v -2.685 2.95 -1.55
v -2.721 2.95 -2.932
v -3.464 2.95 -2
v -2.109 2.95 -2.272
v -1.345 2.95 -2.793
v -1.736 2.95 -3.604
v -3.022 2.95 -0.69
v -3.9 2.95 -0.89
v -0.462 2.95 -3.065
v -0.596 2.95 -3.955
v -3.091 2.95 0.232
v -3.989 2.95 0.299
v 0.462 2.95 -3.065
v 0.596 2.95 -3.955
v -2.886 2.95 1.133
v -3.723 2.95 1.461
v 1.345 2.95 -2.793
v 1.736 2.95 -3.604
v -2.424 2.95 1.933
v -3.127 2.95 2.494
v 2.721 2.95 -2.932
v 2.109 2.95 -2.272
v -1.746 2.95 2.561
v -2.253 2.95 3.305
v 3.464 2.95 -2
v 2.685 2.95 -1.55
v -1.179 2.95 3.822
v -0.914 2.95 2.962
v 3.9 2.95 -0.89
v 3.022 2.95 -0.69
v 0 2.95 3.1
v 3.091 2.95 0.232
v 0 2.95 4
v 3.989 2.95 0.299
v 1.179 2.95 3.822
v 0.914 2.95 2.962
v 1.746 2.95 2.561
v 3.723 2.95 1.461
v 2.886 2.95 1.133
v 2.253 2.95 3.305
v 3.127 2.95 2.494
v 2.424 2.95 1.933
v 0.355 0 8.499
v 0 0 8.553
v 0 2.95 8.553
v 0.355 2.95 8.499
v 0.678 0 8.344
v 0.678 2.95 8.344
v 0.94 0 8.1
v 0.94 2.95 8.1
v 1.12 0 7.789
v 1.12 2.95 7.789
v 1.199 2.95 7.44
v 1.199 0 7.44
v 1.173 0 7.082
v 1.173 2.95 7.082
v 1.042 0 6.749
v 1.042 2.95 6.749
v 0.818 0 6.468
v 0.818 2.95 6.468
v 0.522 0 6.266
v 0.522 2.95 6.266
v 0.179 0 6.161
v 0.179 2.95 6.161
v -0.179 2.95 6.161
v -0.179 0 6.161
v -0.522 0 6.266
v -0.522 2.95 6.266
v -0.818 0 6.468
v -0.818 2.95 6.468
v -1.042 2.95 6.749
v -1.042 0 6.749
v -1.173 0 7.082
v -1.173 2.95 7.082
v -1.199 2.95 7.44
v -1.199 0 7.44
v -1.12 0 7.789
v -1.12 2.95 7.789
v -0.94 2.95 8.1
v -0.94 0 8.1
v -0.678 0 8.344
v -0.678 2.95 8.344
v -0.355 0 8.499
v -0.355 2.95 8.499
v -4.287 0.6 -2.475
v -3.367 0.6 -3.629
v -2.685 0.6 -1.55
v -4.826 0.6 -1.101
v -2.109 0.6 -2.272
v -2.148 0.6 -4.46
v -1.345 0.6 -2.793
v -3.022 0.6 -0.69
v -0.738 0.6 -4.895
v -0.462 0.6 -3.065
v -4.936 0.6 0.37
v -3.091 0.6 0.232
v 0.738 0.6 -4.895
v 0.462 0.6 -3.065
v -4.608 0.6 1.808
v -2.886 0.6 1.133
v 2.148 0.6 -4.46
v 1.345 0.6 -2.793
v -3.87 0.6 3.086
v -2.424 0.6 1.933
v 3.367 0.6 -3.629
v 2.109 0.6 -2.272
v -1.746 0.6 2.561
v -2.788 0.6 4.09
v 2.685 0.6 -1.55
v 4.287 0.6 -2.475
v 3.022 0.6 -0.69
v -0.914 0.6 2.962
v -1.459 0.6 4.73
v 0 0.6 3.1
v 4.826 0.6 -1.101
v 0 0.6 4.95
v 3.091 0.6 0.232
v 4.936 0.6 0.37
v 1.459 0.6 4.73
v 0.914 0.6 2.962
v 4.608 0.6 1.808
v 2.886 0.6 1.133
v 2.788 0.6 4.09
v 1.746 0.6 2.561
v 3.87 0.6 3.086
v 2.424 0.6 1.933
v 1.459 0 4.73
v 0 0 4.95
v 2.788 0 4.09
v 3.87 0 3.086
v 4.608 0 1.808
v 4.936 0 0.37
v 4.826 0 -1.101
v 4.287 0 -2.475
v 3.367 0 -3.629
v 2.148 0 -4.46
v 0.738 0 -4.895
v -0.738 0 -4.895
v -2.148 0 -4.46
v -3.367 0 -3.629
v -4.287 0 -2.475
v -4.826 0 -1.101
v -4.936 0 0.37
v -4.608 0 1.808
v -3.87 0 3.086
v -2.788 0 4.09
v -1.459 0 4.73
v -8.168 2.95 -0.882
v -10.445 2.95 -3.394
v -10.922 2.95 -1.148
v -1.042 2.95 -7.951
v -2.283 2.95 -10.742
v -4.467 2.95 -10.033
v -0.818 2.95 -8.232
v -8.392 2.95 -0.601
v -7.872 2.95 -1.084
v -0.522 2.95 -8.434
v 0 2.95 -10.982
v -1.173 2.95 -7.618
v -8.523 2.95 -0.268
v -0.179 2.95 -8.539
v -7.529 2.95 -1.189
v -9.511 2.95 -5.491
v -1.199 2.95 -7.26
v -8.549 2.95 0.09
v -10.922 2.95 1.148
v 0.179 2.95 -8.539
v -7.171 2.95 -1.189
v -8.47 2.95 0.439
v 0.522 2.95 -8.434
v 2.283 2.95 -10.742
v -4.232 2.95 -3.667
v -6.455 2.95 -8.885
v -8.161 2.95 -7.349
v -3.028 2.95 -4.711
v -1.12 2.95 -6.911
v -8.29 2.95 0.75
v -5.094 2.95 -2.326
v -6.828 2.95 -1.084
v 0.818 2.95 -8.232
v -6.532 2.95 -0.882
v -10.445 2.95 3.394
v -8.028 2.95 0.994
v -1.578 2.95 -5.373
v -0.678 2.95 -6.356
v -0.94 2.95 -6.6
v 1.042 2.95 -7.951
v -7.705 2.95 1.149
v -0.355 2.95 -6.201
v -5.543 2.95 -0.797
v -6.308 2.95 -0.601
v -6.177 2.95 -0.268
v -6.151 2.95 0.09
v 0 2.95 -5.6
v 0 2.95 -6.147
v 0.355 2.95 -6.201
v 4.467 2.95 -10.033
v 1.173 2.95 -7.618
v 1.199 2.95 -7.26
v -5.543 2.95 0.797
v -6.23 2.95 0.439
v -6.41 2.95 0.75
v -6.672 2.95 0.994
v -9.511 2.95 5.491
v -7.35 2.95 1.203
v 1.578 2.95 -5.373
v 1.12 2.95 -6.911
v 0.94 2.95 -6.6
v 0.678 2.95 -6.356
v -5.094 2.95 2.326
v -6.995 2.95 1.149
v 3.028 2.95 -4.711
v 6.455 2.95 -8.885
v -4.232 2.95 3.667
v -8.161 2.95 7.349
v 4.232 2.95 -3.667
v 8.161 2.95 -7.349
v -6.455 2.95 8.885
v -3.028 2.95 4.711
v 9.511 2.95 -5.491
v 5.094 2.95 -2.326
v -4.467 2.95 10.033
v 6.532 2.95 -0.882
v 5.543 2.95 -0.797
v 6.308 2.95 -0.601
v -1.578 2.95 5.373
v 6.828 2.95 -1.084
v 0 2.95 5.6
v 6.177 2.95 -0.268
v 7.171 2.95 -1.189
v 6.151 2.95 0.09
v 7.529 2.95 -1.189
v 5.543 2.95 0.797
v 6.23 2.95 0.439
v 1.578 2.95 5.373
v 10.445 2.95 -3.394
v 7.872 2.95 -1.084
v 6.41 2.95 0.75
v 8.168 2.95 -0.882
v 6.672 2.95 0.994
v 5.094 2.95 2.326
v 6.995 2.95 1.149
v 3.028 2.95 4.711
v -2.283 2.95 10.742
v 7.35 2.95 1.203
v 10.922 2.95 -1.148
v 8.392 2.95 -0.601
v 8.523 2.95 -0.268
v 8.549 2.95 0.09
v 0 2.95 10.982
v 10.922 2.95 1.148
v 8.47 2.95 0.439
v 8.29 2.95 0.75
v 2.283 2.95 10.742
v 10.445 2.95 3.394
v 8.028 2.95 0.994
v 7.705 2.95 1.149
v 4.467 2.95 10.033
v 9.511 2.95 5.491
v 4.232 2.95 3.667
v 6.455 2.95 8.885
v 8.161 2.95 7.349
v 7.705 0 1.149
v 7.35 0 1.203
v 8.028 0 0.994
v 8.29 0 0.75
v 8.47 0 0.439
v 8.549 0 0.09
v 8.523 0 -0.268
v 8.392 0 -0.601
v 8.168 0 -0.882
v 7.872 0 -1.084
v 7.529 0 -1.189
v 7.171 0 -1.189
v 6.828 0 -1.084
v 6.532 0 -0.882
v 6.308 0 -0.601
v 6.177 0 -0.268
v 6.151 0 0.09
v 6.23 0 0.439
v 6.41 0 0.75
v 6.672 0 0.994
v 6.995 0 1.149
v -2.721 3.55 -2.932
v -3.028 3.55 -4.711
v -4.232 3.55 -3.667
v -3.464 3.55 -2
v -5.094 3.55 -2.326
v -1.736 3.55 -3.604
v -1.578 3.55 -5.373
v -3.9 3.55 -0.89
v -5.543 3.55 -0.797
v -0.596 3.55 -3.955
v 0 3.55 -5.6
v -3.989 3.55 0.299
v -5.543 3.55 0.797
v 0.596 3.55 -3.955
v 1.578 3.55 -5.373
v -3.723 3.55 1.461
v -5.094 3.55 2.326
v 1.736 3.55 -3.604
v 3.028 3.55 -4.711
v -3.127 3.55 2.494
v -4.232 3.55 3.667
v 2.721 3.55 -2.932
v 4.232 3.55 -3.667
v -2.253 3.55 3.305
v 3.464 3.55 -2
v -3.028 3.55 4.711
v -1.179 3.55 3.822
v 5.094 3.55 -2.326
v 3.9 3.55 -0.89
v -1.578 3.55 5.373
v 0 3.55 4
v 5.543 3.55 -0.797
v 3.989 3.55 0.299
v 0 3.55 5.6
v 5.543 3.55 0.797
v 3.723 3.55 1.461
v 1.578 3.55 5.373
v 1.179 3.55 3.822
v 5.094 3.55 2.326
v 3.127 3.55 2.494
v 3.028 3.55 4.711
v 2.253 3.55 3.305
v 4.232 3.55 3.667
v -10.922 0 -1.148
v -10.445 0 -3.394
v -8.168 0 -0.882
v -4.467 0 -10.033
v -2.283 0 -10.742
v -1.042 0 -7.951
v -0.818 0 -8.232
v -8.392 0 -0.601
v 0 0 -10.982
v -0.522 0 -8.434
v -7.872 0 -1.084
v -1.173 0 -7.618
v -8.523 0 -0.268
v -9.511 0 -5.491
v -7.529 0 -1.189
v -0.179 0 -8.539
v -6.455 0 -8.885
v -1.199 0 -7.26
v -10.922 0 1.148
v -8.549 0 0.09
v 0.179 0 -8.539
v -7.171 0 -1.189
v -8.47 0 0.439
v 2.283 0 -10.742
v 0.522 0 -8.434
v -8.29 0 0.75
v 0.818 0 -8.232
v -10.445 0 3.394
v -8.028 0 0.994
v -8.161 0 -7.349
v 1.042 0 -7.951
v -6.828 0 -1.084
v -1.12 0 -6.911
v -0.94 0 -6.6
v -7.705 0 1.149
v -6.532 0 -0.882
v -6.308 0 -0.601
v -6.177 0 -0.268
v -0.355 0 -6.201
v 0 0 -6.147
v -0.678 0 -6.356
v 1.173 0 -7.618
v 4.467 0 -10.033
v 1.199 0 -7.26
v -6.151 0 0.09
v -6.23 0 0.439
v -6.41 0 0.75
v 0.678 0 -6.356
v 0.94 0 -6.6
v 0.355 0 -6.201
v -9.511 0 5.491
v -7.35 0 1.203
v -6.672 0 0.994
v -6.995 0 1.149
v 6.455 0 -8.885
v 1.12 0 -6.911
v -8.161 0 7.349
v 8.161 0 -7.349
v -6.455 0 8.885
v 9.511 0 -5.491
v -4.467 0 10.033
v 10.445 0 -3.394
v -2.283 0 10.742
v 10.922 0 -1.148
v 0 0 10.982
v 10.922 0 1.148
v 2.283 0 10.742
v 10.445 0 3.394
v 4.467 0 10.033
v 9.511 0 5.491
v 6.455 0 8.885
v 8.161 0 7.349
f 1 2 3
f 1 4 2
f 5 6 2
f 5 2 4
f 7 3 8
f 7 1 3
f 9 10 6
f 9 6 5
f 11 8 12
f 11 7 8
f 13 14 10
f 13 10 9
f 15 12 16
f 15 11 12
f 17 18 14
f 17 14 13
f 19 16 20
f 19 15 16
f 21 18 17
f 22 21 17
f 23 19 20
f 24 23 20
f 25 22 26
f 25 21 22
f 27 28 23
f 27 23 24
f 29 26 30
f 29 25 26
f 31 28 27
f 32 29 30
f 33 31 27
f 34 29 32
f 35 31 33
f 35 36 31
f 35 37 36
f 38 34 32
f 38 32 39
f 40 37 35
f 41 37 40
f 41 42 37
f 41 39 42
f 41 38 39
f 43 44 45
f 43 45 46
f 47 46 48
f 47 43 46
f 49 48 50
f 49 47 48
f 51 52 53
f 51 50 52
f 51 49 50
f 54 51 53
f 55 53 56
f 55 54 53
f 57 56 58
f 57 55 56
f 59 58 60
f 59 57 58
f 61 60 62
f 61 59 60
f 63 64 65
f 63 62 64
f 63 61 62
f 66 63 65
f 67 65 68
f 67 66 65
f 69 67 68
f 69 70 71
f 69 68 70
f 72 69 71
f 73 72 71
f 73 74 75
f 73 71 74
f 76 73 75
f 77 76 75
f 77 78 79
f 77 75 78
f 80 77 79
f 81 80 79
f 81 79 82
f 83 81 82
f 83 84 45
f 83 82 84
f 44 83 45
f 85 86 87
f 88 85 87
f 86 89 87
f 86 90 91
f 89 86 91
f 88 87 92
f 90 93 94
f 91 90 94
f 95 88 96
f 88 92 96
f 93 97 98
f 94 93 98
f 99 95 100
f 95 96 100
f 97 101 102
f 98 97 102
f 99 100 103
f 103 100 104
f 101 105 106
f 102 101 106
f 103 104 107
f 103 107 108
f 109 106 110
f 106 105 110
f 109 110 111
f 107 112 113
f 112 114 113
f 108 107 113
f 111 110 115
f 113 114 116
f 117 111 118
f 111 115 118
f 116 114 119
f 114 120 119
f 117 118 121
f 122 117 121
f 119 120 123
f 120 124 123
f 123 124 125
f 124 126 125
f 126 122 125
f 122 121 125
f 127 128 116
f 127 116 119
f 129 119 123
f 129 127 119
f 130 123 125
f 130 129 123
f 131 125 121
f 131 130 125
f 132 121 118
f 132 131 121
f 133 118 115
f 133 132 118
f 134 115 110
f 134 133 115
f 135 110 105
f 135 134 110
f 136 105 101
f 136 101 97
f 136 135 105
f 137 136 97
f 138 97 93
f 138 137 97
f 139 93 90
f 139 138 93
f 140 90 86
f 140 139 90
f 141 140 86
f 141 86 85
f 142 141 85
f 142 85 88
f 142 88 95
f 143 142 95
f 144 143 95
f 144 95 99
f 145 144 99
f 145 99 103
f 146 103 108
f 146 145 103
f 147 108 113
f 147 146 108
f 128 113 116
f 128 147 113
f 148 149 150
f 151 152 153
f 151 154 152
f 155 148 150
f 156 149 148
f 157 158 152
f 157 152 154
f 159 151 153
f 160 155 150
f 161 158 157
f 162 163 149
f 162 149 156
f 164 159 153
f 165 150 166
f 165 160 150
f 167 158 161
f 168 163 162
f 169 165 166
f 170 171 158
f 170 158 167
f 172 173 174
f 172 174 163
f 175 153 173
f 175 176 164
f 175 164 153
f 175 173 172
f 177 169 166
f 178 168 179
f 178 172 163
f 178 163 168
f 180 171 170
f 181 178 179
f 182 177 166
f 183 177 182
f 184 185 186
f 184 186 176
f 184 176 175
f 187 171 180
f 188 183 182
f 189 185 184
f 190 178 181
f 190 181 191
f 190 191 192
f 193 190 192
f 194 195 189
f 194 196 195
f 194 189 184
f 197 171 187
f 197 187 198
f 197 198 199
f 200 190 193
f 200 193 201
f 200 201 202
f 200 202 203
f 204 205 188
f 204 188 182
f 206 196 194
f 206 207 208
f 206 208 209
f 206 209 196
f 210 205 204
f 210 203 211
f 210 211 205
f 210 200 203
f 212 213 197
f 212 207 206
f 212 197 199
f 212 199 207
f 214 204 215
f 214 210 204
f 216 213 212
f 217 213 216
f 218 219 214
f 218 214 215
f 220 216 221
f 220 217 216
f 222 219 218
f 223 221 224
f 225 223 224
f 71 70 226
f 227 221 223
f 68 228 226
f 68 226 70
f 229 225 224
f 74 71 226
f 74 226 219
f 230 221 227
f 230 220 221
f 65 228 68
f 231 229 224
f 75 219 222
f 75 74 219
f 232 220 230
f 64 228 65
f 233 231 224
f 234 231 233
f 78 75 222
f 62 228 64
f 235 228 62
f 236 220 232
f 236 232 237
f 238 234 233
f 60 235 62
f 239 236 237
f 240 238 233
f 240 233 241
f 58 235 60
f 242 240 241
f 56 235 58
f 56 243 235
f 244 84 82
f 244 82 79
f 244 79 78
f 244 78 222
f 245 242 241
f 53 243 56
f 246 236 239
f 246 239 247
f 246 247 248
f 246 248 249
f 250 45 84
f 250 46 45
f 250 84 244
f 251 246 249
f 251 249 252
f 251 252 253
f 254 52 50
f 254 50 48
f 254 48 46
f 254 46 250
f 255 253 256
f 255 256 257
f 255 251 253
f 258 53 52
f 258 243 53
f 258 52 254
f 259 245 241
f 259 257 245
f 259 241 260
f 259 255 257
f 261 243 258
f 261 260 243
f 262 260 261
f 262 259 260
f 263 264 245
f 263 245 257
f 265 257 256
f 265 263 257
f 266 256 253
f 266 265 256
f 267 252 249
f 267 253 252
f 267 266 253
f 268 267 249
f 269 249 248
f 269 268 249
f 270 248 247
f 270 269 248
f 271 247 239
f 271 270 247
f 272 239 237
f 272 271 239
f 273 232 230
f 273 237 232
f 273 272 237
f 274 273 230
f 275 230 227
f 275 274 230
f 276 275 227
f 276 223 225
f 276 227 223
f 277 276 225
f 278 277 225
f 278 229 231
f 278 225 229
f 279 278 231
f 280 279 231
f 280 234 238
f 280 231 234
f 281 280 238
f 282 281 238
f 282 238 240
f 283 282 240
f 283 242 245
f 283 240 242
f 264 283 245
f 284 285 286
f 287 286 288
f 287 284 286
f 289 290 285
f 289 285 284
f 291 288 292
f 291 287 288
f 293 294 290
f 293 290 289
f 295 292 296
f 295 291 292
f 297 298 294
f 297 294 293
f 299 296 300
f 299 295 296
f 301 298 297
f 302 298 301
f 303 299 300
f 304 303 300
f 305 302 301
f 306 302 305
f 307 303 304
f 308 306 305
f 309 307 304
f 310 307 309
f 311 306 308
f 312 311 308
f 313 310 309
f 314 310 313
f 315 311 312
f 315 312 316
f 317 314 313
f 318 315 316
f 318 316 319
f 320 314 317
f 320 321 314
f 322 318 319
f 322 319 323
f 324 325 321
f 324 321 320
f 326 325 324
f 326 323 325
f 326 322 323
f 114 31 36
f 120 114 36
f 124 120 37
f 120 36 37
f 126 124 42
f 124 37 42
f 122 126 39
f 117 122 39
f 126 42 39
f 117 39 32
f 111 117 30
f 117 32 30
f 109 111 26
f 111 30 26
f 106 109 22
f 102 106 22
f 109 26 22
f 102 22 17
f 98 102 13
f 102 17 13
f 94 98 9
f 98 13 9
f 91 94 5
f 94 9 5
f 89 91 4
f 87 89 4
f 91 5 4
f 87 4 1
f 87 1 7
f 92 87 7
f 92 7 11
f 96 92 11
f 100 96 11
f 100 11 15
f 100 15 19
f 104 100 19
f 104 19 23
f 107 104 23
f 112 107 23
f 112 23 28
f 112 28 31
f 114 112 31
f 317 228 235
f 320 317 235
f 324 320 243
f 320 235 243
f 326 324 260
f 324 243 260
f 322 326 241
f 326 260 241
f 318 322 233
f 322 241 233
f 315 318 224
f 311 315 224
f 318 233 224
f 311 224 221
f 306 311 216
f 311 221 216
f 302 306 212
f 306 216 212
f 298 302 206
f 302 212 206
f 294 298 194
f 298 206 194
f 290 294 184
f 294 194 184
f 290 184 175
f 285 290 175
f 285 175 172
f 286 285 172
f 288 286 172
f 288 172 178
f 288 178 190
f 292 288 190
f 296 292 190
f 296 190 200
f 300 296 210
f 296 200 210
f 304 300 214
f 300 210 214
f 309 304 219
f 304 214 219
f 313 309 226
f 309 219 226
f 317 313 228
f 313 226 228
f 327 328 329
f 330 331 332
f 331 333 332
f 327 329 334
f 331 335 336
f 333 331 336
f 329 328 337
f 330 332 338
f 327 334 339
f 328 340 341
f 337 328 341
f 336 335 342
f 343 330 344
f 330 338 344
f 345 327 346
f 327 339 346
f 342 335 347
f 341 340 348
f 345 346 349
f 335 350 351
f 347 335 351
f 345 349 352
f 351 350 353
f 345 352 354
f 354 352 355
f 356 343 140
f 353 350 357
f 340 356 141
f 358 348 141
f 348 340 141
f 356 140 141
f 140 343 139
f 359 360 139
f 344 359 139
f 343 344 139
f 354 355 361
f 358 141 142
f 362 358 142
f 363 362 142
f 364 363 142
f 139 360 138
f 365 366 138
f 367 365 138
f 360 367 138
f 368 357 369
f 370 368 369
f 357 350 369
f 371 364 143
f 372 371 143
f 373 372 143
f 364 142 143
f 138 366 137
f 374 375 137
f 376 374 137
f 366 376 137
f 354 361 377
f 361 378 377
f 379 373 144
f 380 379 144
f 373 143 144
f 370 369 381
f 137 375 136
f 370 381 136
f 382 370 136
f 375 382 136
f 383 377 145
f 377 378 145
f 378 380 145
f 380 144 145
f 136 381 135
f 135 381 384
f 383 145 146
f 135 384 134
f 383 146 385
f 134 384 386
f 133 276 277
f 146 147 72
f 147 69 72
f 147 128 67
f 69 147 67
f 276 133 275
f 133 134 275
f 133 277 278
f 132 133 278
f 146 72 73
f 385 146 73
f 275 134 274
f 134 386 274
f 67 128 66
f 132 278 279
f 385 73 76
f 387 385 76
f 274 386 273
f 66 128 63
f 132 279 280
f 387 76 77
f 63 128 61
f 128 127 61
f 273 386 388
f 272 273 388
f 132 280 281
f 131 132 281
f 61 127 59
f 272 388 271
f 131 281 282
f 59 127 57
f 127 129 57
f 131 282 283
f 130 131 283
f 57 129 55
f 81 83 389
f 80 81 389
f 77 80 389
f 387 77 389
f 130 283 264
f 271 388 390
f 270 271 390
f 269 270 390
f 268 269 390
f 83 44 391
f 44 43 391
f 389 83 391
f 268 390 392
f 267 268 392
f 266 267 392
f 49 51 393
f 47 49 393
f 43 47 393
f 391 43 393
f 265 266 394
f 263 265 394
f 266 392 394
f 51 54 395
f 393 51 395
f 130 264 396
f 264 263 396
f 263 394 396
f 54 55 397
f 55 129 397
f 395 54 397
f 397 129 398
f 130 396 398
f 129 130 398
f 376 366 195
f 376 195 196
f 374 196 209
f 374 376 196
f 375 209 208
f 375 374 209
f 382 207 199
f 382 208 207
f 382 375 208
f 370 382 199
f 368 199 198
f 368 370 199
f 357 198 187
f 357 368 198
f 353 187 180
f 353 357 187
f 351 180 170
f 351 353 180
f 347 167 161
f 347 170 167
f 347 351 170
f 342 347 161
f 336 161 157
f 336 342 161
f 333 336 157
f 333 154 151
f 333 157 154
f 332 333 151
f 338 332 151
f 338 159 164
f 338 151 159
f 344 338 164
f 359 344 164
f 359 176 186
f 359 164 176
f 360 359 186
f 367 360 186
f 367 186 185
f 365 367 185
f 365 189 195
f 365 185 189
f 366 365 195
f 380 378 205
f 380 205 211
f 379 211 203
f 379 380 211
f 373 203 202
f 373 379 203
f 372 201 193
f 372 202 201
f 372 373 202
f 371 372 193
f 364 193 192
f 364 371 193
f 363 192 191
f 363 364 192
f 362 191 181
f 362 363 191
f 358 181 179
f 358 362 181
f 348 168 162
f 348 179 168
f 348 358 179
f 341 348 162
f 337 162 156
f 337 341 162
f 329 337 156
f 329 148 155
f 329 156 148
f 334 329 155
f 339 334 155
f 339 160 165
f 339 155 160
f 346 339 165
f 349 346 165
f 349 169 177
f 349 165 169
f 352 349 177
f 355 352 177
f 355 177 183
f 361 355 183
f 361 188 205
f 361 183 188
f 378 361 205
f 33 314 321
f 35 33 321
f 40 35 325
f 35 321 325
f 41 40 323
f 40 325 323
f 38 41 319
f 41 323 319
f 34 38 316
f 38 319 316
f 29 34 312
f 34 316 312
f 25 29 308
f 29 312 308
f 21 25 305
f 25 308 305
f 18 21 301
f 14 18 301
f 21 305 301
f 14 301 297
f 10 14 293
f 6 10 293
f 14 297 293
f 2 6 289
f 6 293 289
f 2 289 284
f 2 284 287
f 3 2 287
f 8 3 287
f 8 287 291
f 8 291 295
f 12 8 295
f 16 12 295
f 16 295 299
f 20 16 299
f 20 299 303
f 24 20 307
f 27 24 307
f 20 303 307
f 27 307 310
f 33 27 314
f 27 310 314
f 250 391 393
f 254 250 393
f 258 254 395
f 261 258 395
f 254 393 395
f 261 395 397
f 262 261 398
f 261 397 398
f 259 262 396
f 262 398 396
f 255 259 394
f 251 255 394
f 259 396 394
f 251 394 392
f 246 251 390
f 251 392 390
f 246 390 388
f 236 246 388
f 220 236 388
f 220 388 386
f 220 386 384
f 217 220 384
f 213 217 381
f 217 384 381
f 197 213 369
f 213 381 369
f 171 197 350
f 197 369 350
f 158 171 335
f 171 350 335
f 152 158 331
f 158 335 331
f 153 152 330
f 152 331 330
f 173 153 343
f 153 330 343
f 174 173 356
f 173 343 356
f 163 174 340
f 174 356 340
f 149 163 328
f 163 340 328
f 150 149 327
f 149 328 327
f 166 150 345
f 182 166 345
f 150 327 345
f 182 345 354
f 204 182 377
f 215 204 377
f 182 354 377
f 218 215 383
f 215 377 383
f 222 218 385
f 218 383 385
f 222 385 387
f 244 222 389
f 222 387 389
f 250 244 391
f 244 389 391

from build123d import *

# Parameters (mm, degrees)
CROQUIS_BASE_R             = 10.982321859
SALIENTE_EXTRUIR1_DEPTH    = 2.95
CORTAR_EXTRUIR1_DEPTH      = 16.809025486
CORTAR_EXTRUIR1_DEPTH_BACK = 16.809025486
CROQUIS_BASE_3_R           = 3
CROQUIS_BASE_3_R_2         = 1.202825727
CROQUIS_BASE_4_R           = 4.95
CORTAR_EXTRUIR2_DEPTH      = 0.6
CROQUIS2_R                 = 5.6
SALIENTE_EXTRUIR2_DEPTH    = 0.6
CROQUIS3_R                 = 3.1
CORTAR_EXTRUIR3_DEPTH      = 16.931895268
CROQUIS3_3_R               = 4
CORTAR_EXTRUIR4_DEPTH      = 0.6


with BuildPart() as part:
    # Croquis base → Saliente-Extruir1 (new body)
    with BuildSketch(Plane(origin=(0, 0, 0), x_dir=(1, 0, 0), z_dir=(0, 1, 0))):
        Circle(CROQUIS_BASE_R)
    extrude(amount=SALIENTE_EXTRUIR1_DEPTH)

    # Croquis base<3> → Cortar-Extruir1 (cut, two sides: drawn at the far end of the back side and taken through both)
    with BuildSketch(Plane(origin=(0, 0, 0), x_dir=(1, 0, 0), z_dir=(0, 1, 0)).offset(-CORTAR_EXTRUIR1_DEPTH_BACK)):
        Circle(CROQUIS_BASE_3_R)
        with Locations((-7.35, 0)):
            Circle(CROQUIS_BASE_3_R_2)
        with Locations((0, 7.35)):
            Circle(CROQUIS_BASE_3_R_2)
        with Locations((7.35, 0)):
            Circle(CROQUIS_BASE_3_R_2)
        with Locations((0, -7.35)):
            Circle(CROQUIS_BASE_3_R_2)
    extrude(amount=CORTAR_EXTRUIR1_DEPTH + CORTAR_EXTRUIR1_DEPTH_BACK, mode=Mode.SUBTRACT)

    # Croquis base<4> → Cortar-Extruir2 (cut)
    with BuildSketch(Plane(origin=(0, 0, 0), x_dir=(1, 0, 0), z_dir=(0, 1, 0))):
        Circle(CROQUIS_BASE_4_R)
    extrude(amount=CORTAR_EXTRUIR2_DEPTH, mode=Mode.SUBTRACT)

    # Croquis2 → Saliente-Extruir2 (add)
    with BuildSketch(Plane(origin=(0, 2.95, 0), x_dir=(1, 0, 0), z_dir=(0, 1, 0))):
        Circle(CROQUIS2_R)
    extrude(amount=SALIENTE_EXTRUIR2_DEPTH)

    # Croquis3 → Cortar-Extruir3 (cut, through all)
    with BuildSketch(Plane(origin=(0, 3.55, 0), x_dir=(1, 0, 0), z_dir=(0, 1, 0))):
        Circle(CROQUIS3_R)
    extrude(amount=-CORTAR_EXTRUIR3_DEPTH, mode=Mode.SUBTRACT)

    # Croquis3<3> → Cortar-Extruir4 (cut)
    with BuildSketch(Plane(origin=(0, 3.55, 0), x_dir=(1, 0, 0), z_dir=(0, 1, 0))):
        Circle(CROQUIS3_3_R)
    extrude(amount=-CORTAR_EXTRUIR4_DEPTH, mode=Mode.SUBTRACT)


solid = part.part
